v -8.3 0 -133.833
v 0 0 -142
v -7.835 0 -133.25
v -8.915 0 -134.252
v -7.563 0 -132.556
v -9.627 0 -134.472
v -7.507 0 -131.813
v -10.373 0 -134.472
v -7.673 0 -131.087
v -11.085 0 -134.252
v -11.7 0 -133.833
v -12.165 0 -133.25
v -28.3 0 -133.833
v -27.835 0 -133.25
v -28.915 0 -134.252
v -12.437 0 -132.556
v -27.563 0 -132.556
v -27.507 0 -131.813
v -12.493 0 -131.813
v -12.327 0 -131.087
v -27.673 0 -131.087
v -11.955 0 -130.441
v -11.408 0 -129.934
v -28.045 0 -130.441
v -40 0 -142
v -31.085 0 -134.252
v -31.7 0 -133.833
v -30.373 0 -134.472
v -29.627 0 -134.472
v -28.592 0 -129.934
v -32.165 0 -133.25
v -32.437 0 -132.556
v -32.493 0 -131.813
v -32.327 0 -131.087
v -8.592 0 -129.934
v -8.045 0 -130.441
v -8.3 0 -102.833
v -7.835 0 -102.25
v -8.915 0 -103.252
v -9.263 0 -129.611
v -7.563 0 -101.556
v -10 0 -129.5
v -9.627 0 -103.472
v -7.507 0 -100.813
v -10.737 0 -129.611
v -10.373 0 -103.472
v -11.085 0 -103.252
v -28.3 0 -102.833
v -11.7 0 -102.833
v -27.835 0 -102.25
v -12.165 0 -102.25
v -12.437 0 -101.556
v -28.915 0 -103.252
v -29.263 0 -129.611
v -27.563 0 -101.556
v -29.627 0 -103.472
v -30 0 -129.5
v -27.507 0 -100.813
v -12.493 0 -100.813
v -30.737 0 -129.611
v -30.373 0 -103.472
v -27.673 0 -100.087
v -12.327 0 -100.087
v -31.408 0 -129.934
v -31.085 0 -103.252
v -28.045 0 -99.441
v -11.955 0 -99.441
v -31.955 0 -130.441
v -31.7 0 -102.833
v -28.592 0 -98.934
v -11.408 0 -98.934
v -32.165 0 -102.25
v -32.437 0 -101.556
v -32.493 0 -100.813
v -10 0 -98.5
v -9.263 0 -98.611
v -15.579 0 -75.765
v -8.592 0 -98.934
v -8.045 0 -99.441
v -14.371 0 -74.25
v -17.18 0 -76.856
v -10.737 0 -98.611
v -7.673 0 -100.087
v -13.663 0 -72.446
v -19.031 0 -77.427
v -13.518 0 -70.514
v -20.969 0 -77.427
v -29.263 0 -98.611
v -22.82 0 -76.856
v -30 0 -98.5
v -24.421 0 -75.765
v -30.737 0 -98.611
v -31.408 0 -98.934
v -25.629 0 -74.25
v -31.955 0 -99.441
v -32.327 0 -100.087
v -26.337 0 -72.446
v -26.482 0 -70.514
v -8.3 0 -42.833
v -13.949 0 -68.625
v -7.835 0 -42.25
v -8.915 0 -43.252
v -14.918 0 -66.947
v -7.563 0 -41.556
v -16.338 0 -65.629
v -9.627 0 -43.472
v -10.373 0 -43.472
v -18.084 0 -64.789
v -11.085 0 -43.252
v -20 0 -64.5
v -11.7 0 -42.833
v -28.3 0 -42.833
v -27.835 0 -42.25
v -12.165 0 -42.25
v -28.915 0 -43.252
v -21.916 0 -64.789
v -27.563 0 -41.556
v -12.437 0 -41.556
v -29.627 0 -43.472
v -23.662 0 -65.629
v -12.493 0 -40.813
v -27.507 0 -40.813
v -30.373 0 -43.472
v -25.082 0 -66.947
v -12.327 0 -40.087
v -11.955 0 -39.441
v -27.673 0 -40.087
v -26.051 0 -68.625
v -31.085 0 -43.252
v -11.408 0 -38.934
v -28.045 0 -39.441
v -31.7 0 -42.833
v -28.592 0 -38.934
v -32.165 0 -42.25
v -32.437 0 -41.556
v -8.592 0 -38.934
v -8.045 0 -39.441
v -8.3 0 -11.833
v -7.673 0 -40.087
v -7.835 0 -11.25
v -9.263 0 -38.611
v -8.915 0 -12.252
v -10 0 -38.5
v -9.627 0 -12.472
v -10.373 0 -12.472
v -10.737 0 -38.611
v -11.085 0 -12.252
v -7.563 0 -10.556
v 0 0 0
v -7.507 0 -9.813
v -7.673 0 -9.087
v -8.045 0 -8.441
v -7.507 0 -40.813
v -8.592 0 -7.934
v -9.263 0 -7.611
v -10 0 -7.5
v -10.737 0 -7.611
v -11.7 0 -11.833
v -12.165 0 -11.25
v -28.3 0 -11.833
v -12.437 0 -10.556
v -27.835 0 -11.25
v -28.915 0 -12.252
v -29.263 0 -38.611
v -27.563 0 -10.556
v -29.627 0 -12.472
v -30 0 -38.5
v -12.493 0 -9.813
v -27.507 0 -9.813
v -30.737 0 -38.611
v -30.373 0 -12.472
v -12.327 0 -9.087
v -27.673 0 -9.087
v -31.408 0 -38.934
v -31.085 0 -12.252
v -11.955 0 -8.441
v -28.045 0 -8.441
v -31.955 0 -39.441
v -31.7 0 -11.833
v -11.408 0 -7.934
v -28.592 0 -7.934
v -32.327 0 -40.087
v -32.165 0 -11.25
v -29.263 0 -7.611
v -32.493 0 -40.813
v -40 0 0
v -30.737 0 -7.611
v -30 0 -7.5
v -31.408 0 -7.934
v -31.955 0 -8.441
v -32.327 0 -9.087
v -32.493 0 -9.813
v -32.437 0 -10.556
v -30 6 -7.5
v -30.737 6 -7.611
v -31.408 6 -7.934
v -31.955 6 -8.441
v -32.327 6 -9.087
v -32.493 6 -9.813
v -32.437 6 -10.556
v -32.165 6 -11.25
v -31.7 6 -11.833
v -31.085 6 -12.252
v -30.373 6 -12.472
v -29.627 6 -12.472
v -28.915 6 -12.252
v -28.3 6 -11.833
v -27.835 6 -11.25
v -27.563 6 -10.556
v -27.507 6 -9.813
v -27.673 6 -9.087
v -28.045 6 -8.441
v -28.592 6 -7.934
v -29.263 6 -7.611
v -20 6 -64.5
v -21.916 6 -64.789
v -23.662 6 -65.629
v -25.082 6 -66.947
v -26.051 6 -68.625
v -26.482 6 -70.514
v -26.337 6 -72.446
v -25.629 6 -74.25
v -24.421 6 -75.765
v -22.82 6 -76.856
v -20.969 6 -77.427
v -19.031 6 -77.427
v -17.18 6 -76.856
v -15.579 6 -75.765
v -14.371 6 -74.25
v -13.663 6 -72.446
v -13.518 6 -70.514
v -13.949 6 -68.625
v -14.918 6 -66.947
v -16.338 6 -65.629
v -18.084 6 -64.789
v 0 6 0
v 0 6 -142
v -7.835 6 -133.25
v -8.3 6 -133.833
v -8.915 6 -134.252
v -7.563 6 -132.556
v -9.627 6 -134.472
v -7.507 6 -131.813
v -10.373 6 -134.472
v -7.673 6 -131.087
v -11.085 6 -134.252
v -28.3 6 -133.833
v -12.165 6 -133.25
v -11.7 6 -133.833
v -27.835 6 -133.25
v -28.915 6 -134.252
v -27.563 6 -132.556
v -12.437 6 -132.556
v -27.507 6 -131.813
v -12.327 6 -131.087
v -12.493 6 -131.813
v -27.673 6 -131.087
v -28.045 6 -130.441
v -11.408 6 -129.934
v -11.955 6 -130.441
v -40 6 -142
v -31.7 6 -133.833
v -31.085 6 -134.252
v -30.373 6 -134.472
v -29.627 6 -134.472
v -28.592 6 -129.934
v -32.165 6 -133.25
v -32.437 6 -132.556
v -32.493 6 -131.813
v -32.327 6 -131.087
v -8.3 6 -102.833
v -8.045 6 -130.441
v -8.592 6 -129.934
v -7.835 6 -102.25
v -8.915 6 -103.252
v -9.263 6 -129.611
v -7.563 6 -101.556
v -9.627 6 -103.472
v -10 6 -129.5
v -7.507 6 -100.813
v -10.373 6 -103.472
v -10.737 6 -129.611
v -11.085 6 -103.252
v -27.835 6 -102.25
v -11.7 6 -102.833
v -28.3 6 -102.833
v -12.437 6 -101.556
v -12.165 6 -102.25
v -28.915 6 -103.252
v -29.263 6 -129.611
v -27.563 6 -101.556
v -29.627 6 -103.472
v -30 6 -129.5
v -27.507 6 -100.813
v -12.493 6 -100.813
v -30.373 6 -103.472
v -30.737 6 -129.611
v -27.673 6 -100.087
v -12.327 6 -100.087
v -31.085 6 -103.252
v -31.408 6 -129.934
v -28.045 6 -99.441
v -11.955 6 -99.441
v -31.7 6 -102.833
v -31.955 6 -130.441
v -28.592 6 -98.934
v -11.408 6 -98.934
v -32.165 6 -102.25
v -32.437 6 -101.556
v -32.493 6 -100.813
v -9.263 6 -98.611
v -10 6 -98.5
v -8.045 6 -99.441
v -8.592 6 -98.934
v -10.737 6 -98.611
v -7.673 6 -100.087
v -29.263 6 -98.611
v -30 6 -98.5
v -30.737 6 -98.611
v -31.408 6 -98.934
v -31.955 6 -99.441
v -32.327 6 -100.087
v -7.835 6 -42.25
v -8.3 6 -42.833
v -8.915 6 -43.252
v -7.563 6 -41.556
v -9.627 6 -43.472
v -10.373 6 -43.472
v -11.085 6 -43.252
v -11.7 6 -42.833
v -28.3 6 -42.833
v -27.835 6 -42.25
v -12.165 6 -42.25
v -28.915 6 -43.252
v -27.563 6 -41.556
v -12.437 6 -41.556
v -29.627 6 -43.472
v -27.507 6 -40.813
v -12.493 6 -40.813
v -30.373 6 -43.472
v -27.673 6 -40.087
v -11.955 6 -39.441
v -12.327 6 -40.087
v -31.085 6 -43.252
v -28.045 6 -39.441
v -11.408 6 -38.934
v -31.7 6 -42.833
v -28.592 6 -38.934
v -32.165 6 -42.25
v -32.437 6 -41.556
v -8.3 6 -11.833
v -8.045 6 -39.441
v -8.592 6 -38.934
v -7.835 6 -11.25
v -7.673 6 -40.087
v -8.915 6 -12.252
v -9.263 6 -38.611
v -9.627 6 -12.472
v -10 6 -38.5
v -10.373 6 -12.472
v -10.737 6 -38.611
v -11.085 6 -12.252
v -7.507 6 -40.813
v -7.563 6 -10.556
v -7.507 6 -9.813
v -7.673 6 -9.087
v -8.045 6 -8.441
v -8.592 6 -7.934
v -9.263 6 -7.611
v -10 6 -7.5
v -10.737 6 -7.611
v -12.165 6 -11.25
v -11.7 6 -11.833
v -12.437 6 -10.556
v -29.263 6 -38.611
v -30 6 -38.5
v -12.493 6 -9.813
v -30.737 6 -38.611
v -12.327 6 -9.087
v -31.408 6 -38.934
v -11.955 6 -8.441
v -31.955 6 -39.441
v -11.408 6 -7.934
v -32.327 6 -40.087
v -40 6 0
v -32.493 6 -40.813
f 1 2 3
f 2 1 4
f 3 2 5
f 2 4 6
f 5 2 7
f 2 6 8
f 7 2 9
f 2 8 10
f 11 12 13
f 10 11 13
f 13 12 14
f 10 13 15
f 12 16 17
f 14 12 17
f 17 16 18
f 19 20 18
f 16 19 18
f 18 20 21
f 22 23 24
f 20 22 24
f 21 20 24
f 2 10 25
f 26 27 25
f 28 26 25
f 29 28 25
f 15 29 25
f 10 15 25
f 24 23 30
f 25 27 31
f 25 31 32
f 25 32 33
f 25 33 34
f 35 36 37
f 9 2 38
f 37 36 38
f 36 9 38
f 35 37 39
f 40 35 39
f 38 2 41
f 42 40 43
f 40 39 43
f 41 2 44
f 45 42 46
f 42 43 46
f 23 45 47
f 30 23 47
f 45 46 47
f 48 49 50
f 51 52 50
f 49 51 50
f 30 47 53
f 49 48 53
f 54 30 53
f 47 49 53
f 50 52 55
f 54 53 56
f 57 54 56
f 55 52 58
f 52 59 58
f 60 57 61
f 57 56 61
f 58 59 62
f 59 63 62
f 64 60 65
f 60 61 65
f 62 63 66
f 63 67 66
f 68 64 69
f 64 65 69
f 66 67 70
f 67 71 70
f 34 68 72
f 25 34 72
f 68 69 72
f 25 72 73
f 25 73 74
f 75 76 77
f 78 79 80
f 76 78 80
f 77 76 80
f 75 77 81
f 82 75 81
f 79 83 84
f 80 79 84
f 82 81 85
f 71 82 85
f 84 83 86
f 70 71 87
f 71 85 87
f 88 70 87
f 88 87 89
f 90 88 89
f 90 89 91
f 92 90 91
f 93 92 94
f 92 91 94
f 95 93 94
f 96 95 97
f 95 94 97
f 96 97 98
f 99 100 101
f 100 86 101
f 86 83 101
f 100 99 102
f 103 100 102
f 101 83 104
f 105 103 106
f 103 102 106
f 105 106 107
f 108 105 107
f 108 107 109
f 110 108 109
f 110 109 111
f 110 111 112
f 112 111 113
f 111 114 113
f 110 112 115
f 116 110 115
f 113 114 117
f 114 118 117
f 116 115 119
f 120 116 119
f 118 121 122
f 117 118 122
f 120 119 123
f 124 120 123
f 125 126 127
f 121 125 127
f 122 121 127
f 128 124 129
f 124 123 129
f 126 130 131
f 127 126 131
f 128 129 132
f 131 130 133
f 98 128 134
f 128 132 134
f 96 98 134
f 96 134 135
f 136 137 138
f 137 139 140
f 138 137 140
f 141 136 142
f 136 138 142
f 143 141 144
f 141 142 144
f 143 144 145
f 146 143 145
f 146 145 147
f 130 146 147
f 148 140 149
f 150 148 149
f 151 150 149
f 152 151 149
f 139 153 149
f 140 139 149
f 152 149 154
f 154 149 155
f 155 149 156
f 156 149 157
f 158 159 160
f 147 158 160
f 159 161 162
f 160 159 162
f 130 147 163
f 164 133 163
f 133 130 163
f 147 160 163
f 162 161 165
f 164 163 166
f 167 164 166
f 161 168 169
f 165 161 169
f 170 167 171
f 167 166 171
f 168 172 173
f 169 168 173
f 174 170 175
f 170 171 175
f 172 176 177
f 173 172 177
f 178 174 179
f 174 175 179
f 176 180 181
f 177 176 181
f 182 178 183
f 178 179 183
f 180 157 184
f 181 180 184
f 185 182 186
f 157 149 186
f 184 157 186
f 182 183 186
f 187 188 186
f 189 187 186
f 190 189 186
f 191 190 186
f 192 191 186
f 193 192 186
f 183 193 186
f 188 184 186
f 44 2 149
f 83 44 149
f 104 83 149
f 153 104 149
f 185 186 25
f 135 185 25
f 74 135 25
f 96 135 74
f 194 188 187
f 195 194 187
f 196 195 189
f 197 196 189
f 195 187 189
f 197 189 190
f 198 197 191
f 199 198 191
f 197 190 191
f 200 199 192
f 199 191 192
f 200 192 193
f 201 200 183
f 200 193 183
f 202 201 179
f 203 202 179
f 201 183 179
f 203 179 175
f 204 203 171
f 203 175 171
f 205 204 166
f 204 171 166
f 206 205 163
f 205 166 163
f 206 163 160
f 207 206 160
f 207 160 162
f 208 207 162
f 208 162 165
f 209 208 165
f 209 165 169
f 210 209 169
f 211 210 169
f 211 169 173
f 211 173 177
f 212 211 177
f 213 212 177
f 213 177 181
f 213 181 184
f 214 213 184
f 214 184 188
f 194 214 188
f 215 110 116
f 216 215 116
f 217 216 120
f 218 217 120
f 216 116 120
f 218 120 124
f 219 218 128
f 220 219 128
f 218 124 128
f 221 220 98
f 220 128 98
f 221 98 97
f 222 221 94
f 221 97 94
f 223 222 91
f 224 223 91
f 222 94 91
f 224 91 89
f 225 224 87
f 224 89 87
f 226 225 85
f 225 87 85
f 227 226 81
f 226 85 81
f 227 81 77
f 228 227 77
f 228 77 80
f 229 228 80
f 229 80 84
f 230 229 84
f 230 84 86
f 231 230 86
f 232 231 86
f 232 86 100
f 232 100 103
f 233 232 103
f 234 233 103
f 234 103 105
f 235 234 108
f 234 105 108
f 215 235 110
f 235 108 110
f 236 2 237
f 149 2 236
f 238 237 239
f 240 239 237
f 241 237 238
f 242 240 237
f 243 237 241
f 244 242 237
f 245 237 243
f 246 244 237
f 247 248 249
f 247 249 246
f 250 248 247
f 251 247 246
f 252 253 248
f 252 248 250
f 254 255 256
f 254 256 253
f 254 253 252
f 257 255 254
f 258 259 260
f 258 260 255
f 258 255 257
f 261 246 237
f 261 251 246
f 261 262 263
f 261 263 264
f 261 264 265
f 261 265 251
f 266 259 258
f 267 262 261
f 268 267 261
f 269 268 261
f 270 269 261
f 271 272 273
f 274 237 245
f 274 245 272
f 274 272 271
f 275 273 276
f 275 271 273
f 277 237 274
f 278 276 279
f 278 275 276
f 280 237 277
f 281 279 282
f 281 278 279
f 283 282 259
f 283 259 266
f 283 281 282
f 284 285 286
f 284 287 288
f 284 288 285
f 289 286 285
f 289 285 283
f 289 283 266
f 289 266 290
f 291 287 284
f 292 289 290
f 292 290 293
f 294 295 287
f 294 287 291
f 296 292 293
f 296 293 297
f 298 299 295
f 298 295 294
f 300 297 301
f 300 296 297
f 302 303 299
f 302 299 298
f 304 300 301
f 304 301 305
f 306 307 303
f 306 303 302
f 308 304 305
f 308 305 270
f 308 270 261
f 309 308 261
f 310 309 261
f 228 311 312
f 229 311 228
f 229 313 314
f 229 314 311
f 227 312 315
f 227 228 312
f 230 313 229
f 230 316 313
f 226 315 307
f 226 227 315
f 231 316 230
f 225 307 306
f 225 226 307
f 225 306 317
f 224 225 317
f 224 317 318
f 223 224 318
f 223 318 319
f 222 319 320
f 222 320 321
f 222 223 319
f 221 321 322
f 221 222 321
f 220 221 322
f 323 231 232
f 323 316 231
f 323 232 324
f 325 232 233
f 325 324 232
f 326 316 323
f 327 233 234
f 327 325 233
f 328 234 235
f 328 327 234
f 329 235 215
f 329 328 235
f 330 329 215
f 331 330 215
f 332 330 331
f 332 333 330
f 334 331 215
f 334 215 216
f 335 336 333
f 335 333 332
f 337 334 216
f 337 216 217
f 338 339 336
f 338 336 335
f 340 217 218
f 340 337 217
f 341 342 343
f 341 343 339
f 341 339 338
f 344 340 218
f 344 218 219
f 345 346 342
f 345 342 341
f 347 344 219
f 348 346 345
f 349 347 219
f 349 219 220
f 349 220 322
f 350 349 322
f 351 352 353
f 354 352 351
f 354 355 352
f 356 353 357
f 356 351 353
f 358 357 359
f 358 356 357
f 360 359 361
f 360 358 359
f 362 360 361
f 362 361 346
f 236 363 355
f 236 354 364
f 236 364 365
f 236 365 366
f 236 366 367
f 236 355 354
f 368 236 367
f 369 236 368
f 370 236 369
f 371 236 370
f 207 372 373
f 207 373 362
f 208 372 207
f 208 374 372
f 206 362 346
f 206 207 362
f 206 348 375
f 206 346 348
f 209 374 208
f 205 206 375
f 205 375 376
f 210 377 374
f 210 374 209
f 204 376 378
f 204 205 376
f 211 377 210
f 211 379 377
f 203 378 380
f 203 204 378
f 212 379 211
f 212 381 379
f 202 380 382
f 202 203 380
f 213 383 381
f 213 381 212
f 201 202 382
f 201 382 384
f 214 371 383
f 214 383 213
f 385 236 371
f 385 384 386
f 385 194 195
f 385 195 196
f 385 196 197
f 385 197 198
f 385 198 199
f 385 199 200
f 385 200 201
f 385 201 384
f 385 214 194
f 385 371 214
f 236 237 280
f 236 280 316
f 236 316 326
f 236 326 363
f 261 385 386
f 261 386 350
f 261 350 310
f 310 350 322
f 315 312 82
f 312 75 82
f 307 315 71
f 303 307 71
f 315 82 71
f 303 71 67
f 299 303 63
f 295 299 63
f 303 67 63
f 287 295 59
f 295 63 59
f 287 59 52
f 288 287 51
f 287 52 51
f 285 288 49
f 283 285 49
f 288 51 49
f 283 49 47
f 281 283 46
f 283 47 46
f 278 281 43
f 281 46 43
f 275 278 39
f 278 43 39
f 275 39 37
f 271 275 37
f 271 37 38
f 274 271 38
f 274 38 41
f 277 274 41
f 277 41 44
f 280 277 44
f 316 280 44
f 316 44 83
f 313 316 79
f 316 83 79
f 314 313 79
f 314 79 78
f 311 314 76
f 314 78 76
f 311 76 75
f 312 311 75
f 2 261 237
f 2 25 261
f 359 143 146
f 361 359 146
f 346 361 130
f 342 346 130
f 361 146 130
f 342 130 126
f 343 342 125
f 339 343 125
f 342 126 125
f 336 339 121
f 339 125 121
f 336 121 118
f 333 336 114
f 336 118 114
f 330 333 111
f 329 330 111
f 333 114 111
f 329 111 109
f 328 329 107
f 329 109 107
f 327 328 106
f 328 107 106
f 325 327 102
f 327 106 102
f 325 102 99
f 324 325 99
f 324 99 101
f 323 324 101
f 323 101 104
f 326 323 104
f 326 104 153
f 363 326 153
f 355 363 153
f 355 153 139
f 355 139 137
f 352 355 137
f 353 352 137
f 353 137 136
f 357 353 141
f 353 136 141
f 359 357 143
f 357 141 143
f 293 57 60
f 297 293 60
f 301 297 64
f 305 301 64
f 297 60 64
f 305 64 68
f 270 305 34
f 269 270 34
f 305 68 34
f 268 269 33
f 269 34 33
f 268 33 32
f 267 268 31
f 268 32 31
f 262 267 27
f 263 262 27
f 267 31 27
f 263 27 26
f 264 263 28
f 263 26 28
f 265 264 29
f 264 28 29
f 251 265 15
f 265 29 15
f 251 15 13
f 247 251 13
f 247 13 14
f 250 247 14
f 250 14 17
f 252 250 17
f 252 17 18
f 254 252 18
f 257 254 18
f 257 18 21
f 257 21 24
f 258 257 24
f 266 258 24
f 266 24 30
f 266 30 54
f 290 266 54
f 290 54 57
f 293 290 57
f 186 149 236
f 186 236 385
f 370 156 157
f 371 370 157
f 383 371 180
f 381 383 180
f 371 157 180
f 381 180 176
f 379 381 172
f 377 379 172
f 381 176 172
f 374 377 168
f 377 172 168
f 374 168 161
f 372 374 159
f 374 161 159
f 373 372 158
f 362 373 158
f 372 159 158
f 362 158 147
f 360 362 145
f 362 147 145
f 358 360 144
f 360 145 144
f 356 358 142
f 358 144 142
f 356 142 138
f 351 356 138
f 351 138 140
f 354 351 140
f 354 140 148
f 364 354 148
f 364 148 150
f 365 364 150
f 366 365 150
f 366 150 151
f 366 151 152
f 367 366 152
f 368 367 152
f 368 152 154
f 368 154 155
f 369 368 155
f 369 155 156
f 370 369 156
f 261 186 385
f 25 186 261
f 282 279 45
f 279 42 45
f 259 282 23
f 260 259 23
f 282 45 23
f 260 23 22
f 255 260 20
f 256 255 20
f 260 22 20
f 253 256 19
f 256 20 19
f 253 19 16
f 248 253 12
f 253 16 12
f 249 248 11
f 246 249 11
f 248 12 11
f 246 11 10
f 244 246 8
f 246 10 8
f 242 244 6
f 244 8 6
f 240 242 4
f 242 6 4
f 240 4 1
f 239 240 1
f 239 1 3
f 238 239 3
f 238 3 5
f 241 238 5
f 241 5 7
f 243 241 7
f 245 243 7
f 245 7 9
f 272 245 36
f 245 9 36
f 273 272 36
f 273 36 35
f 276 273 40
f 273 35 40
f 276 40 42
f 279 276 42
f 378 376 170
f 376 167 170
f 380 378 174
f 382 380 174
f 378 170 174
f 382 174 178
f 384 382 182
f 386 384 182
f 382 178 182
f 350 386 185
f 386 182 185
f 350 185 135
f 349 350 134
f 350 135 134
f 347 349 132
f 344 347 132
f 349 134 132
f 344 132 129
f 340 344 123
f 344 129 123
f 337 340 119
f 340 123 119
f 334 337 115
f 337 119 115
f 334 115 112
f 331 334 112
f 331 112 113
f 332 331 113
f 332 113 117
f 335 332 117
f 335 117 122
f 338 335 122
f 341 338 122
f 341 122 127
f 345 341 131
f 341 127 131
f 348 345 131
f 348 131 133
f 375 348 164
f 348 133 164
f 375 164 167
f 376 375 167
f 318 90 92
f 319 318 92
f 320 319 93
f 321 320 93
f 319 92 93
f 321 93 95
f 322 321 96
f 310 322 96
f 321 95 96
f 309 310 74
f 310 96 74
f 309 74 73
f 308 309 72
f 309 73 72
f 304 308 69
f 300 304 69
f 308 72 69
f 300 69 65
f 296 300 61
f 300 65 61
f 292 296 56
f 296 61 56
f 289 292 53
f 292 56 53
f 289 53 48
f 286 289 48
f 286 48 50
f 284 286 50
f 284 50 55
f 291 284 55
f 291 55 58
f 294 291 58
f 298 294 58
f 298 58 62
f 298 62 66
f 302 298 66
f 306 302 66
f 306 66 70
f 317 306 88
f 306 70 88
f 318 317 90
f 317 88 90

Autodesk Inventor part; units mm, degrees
ref_plane "YZ Plane" through (0, 0, 0) normal (1, 0, 0) x (0, 1, 0)
ref_plane "XZ Plane" through (0, 0, 0) normal (0, 1, 0) x (-1, 0, 0)
ref_plane "XY Plane" through (0, 0, 0) normal (0, 0, 1) x (1, 0, 0)
sketch "Esboço1" plane through (0, 0, 0) normal (0, 1, 0) x (-1, 0, 0)
  line L0 (0, 0) -> (40, 0)
  line L1 (40, 0) -> (40, -142)
  line L2 (40, -142) -> (0, -142)
  line L3 (0, -142) -> (0, 0)
  dimension "d0" = 40
  dimension "d1" = 142
extrude "Extrusão1" add sketch "Esboço1" along normal blind 6
sketch "Esboço2" plane through (0, 6, 0) normal (0, 1, 0) x (1, 0, 0)
  line L0 (-40, 142) -> (-40, 0) projected
  line L1 (-40, 0) -> (0, 0) projected
  point P0 (-20, 71)
  dimension "d4" = 142
  dimension "d5" = 40
  dimension "d6" = 20
  dimension "d7" = 71
hole "Furo1" at (-20, 6, -71) direction (0, -1, 0) diameter 13 depth 6
sketch "Esboço4" plane through (0, 6, 0) normal (0, 1, 0) x (1, 0, 0)
  line L0 (0, 142) -> (-40, 142) projected
  line L1 (0, 0) -> (0, 142) projected
  line L2 (-40, 0) -> (0, 0) projected
  line L3 (-40, 142) -> (-40, 0) projected
  circle A0 centre (-20, 71) radius 6.5 projected
  point P0 (-10, 10)
  point P1 (-10, 132)
  point P2 (-20, 0)
  point P3 (-30, 132)
  point P4 (-30, 10)
  point P5 (-30, 101)
  point P6 (-10, 101)
  point P7 (-10, 41)
  point P8 (-30, 41)
  dimension "d45" = 40
  dimension "d46" = 10
  dimension "d47" = 10
  dimension "d48" = 10
  dimension "d49" = 10
  dimension "d57" = 10
  dimension "d58" = 10
  dimension "d59" = 10
  dimension "d60" = 60
  dimension "d61" = 30
hole "Furo3" at (-10, 6, -10) at (-10, 6, -132) at (-30, 6, -10) at (-30, 6, -132) at (-30, 6, -41) at (-10, 6, -41) at (-30, 6, -101) at (-10, 6, -101) direction (0, -1, 0) diameter 5 end through all
equation "\"d6\" = 0.5 * d5"
equation "\"d7\" = 0.5 * d4"
equation "\"d13\" = Espessura"
equation "\"d48\" = d47"
equation "\"d57\" = d49"
equation "\"d58\" = d46"
equation "\"d59\" = d47"
equation "\"d61\" = 0.5 * d60"
equation "\"d55\" = Espessura"
equation "\"Raio_vergadura\" = Espessura"
equation "\"Largura_alívio_de_vergadura\" = Espessura"
equation "\"Profundidade_alívio_de_vergadura\" = 0.5 * Espessura"
equation "\"Tamanho_alívio_de_dobra\" = 4 * Espessura"
equation "\"Remanescente_mínimo\" = 2 * Espessura"
equation "\"Raiodetransição\" = Raio_vergadura"
equation "\"Tamanho_de_raio_de_Jacobi\" = Raio_vergadura"
equation "\"TamanhoFolga\" = Espessura"
equation "\"Espessura\" = 0.5"
properties part number "Suporte superior do eixo" material "Aluminum 6061"
